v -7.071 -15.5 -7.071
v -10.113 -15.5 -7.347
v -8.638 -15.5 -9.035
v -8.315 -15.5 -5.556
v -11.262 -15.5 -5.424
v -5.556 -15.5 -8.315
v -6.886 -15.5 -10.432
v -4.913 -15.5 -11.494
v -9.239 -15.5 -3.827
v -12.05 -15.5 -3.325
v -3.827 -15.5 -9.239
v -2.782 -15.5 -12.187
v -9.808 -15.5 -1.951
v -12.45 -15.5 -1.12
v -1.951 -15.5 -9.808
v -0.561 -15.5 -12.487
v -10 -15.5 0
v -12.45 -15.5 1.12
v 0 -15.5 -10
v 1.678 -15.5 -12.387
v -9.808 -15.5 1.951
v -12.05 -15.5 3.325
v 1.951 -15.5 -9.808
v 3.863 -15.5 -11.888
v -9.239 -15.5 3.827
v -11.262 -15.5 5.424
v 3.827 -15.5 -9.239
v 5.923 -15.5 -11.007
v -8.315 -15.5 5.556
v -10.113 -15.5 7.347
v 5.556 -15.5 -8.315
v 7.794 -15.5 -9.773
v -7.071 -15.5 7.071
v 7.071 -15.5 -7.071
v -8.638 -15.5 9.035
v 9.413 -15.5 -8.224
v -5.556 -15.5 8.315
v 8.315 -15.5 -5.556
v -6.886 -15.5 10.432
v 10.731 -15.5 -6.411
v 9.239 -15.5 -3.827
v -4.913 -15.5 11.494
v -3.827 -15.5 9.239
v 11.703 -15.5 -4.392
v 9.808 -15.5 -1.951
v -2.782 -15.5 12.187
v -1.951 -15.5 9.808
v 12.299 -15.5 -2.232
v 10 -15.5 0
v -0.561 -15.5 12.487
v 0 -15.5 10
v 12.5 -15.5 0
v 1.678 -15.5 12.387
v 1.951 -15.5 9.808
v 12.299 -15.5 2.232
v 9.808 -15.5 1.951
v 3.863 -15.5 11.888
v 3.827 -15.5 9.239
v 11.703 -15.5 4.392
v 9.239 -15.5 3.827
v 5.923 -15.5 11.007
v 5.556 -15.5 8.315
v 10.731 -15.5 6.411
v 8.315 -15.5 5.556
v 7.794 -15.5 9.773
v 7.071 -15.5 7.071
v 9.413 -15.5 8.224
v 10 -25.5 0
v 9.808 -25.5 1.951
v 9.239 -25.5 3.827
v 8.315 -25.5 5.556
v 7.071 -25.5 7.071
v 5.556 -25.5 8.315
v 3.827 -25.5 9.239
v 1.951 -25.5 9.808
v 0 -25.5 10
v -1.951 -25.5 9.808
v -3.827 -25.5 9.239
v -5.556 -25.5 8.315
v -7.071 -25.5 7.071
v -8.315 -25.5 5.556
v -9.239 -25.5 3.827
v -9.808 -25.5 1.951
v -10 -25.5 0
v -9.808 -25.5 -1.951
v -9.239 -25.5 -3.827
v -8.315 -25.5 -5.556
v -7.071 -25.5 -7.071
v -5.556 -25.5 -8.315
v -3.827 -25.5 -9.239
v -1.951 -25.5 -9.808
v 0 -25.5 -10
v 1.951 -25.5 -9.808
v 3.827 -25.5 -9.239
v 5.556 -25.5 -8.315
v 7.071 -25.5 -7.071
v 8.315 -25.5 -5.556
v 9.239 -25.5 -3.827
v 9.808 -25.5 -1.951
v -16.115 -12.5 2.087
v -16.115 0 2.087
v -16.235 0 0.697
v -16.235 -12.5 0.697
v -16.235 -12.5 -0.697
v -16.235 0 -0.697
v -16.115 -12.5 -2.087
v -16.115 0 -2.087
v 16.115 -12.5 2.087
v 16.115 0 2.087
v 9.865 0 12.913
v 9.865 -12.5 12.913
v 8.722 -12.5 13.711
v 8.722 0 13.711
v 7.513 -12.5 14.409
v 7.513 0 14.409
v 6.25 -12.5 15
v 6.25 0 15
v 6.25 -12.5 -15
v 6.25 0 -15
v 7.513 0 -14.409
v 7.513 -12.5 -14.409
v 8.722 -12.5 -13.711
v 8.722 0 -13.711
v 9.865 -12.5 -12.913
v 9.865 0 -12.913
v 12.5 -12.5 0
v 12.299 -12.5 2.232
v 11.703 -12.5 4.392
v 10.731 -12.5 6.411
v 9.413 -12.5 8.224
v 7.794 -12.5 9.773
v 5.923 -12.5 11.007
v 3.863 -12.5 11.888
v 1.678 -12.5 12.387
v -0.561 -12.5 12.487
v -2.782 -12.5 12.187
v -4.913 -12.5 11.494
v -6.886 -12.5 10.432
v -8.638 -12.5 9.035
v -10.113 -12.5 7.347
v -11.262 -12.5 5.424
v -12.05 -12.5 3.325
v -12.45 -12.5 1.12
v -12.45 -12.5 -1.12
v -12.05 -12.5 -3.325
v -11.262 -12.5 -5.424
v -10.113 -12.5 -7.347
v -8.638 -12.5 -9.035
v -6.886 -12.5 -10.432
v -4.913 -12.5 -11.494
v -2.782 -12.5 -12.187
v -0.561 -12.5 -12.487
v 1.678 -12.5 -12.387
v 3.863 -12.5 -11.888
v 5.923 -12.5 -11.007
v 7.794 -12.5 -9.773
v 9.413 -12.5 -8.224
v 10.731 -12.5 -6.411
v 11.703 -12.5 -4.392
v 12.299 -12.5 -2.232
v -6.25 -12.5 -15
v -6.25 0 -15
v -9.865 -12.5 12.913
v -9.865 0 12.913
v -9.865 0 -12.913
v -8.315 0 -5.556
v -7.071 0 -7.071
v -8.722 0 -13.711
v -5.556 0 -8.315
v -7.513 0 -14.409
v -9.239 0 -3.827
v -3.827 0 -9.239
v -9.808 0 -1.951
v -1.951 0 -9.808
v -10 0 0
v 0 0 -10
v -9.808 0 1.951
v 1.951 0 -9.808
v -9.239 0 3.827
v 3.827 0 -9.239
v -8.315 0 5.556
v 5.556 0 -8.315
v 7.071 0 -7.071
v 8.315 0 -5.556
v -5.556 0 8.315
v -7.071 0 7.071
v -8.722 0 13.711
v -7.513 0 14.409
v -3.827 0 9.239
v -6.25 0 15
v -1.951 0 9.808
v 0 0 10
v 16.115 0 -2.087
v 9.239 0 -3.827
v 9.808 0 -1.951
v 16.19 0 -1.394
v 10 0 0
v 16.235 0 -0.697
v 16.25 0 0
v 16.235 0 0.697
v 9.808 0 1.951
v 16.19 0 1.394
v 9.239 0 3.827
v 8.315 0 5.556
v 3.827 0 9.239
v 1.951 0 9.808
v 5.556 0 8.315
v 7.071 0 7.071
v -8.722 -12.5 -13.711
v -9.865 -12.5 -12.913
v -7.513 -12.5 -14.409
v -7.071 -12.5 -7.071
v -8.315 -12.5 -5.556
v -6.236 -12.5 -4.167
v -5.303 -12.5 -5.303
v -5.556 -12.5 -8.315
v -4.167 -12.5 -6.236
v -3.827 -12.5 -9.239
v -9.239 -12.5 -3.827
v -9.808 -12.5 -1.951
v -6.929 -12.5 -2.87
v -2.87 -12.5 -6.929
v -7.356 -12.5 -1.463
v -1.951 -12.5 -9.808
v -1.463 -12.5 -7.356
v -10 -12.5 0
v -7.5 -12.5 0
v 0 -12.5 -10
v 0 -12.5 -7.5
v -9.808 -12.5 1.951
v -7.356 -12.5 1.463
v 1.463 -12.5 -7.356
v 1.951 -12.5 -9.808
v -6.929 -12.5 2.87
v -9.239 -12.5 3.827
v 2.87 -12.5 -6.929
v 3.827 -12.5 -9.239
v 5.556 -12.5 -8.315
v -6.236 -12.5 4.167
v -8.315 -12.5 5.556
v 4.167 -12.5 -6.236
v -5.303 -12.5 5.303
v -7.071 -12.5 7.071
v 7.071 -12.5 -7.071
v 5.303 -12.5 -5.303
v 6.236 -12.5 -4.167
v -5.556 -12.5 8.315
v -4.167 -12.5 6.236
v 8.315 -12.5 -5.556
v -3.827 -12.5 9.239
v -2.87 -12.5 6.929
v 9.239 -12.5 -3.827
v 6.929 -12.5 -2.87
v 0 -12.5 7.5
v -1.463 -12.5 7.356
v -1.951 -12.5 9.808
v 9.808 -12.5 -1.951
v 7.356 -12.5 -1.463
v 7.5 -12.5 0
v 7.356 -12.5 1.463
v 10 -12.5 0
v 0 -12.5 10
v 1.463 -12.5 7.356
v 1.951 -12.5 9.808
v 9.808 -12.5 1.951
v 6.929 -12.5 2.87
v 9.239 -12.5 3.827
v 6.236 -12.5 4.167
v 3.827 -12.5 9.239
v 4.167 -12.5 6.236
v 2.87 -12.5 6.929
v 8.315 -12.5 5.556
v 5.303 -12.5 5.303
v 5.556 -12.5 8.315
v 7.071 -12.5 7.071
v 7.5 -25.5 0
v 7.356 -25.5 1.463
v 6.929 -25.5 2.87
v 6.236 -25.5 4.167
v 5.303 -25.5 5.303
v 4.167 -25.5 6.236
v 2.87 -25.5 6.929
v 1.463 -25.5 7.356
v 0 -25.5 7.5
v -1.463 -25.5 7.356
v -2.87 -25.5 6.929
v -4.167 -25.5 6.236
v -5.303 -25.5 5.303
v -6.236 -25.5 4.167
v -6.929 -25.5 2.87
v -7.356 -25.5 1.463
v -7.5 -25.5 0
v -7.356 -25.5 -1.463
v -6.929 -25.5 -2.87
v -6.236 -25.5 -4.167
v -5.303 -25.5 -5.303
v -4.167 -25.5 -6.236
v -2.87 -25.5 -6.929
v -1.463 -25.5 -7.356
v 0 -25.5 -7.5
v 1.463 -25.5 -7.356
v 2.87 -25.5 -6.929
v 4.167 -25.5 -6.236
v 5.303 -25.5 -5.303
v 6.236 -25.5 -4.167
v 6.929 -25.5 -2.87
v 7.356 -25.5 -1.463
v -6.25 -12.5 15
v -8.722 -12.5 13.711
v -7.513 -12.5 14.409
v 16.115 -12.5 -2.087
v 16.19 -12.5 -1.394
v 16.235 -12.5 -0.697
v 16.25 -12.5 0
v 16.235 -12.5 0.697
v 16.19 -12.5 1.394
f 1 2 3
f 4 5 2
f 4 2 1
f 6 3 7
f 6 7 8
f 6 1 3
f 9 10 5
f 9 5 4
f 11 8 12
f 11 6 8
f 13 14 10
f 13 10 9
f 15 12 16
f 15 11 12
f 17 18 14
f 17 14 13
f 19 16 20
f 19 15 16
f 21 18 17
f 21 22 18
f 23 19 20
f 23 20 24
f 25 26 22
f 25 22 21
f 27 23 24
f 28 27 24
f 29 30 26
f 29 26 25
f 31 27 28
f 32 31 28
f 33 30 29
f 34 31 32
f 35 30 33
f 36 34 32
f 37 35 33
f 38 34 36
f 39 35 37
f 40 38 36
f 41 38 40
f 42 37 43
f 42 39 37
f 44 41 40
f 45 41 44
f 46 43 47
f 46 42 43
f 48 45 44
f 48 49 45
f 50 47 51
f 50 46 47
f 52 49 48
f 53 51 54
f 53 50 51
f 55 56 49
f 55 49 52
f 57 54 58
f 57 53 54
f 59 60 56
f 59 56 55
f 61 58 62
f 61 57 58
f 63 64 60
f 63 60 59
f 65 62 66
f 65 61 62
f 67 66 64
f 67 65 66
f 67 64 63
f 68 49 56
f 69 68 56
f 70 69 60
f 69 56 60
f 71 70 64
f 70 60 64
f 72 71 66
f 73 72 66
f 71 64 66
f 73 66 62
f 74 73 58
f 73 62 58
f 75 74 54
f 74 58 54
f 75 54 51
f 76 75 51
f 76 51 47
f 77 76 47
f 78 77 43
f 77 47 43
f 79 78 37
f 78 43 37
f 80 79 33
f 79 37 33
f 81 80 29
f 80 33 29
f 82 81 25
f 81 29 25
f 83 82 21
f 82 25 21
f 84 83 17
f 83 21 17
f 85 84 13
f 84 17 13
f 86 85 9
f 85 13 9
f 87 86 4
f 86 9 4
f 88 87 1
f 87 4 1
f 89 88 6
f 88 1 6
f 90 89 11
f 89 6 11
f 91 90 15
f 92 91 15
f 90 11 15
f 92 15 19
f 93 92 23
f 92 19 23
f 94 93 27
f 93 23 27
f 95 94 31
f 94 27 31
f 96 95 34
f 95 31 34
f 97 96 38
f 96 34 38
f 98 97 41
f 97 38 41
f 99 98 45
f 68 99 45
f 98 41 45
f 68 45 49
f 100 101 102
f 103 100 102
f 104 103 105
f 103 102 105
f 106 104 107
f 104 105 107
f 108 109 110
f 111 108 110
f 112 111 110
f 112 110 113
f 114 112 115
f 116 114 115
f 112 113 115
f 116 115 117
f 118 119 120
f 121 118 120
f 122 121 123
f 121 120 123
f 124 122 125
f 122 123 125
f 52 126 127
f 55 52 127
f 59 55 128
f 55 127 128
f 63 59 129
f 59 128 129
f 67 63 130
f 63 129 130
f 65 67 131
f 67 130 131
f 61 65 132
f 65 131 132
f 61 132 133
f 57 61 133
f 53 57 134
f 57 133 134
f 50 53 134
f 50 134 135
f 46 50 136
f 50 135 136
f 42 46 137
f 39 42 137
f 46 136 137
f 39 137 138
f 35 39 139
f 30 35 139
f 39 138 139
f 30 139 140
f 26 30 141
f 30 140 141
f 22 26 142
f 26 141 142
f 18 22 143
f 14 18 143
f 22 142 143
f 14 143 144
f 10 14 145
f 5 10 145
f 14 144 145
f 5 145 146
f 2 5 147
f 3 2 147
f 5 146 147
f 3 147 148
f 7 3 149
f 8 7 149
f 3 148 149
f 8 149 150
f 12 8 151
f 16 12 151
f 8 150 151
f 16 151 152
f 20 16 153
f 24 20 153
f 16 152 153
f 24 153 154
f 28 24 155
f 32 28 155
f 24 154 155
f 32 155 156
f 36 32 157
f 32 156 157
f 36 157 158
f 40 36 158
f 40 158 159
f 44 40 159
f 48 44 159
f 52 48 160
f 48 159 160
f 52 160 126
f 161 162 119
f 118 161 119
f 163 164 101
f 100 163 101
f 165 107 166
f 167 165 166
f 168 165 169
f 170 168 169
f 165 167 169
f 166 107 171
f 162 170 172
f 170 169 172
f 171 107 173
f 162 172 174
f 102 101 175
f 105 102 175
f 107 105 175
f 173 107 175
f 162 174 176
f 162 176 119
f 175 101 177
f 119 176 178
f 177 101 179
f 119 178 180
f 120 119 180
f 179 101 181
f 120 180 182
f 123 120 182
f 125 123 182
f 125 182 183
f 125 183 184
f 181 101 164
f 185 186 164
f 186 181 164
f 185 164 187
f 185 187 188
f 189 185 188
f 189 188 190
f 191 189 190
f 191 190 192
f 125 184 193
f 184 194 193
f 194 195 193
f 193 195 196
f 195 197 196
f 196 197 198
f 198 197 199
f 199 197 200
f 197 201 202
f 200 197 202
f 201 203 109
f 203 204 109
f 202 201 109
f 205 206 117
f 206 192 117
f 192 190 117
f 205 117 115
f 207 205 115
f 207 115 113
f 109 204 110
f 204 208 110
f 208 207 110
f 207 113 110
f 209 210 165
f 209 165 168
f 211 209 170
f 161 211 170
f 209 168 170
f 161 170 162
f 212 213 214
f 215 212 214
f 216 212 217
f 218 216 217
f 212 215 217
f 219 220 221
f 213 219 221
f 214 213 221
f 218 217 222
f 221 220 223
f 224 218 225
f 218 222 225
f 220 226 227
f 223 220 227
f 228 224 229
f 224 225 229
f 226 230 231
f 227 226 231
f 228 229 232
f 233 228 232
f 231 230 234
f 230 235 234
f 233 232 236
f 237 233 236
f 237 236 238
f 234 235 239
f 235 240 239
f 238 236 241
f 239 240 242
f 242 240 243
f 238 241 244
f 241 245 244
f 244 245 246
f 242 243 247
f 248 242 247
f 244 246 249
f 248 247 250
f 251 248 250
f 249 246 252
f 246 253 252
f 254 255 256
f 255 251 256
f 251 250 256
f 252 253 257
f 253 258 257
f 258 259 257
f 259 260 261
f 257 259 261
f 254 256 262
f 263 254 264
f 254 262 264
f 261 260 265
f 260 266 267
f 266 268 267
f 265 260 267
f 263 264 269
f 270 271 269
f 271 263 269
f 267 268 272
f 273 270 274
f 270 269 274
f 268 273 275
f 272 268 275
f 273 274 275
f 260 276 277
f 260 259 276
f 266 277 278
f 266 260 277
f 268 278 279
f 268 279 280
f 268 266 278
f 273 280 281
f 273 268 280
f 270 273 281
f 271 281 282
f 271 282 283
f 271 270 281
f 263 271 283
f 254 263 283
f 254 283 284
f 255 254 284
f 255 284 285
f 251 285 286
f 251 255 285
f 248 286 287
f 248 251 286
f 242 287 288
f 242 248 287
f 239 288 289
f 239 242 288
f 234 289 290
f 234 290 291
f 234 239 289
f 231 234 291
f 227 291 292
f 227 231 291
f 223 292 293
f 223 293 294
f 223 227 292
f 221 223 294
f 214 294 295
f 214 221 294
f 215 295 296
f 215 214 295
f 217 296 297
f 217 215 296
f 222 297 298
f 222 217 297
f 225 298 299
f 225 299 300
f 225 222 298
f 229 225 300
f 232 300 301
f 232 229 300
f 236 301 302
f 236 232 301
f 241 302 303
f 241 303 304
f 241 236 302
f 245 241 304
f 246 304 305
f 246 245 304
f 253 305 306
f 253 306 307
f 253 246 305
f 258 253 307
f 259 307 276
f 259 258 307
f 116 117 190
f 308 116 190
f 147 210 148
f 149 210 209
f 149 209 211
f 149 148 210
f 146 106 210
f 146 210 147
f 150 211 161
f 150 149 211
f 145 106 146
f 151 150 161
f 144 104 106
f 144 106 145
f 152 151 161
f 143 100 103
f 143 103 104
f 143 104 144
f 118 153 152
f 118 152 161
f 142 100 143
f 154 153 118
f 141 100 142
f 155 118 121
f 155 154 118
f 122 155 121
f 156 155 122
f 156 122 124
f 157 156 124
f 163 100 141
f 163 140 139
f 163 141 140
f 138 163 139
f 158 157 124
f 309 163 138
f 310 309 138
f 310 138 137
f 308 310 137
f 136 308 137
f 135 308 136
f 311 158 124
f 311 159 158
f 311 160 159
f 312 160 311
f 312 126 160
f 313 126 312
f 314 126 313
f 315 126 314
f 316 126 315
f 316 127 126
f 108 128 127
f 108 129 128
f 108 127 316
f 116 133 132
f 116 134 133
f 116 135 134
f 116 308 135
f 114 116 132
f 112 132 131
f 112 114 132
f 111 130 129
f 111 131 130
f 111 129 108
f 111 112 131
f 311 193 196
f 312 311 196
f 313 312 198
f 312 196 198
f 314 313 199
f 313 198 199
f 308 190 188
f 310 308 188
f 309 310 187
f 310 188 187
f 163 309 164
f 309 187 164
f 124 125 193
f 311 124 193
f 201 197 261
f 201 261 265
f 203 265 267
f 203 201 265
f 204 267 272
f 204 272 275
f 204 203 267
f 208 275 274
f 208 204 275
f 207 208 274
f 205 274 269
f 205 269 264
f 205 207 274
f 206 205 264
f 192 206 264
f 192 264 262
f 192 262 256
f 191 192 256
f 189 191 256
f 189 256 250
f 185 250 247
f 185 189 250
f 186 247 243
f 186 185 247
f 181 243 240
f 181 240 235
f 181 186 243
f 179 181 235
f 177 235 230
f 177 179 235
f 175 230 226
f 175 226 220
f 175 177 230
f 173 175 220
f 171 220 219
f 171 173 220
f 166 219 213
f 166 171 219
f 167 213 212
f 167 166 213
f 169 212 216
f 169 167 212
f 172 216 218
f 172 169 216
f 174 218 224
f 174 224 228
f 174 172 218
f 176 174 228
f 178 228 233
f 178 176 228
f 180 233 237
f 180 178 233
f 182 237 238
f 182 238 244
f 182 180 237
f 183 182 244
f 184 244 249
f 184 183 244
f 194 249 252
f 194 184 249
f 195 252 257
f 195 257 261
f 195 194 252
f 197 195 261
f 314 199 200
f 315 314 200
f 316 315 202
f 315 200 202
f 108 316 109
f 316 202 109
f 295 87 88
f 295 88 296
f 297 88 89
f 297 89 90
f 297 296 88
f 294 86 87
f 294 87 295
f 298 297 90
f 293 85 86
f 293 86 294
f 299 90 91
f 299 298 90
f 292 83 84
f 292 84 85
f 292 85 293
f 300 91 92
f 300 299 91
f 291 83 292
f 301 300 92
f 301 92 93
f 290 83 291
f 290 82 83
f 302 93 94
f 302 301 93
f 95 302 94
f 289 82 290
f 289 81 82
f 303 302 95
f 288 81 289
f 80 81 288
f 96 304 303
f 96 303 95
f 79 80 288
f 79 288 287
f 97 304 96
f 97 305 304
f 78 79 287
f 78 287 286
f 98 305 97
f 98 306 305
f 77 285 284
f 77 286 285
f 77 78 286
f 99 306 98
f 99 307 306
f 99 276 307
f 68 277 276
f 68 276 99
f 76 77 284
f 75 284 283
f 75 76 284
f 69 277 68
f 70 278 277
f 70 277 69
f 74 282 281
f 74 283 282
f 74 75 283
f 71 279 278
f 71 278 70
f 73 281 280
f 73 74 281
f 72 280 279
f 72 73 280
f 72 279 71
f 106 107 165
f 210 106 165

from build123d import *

# Parameters (mm, degrees)
F0_R     = 10
F1_DEPTH = 12.5
F2_R     = 12.5
F2_R_2   = 7.5
F3_DEPTH = 3
F4_R     = 10
F4_R_2   = 7.5
F5_DEPTH = 10


with BuildPart() as f1:
    # F0 (on Front) → F1 (new body)
    with BuildSketch(Plane.XZ):
        with BuildLine():
            Line((6.25, 15), (-6.25, 15))
            ThreePointArc((-6.25, 15), (-8.125, 14.072913), (-9.865381, 12.912659))
            Line((-9.865381, 12.912659), (-16.115381, 2.087341))
            ThreePointArc((-16.115381, 2.087341), (-16.25, 0), (-16.115381, -2.087341))
            Line((-16.115381, -2.087341), (-9.865381, -12.912659))
            ThreePointArc((-9.865381, -12.912659), (-8.125, -14.072913), (-6.25, -15))
            Line((-6.25, -15), (6.25, -15))
            ThreePointArc((6.25, -15), (8.125, -14.072913), (9.865381, -12.912659))
            Line((9.865381, -12.912659), (16.115381, -2.087341))
            ThreePointArc((16.115381, -2.087341), (16.21631, -1.045839), (16.25, 0))
            ThreePointArc((16.25, 0), (16.21631, 1.045839), (16.115381, 2.087341))
            Line((16.115381, 2.087341), (9.865381, 12.912659))
            ThreePointArc((9.865381, 12.912659), (8.125, 14.072913), (6.25, 15))
        make_face()
        Circle(F0_R, mode=Mode.SUBTRACT)
    extrude(amount=F1_DEPTH)

    # F2 (on face) → F3 (join)
    with BuildSketch(Plane.XZ.offset(12.5)):
        Circle(F2_R)
        Circle(F2_R_2, mode=Mode.SUBTRACT)
    extrude(amount=F3_DEPTH)

    # F4 (on face) → F5 (join)
    with BuildSketch(Plane.XZ.offset(15.5)):
        Circle(F4_R)
        Circle(F4_R_2, mode=Mode.SUBTRACT)
    extrude(amount=F5_DEPTH)


solid = f1.part
